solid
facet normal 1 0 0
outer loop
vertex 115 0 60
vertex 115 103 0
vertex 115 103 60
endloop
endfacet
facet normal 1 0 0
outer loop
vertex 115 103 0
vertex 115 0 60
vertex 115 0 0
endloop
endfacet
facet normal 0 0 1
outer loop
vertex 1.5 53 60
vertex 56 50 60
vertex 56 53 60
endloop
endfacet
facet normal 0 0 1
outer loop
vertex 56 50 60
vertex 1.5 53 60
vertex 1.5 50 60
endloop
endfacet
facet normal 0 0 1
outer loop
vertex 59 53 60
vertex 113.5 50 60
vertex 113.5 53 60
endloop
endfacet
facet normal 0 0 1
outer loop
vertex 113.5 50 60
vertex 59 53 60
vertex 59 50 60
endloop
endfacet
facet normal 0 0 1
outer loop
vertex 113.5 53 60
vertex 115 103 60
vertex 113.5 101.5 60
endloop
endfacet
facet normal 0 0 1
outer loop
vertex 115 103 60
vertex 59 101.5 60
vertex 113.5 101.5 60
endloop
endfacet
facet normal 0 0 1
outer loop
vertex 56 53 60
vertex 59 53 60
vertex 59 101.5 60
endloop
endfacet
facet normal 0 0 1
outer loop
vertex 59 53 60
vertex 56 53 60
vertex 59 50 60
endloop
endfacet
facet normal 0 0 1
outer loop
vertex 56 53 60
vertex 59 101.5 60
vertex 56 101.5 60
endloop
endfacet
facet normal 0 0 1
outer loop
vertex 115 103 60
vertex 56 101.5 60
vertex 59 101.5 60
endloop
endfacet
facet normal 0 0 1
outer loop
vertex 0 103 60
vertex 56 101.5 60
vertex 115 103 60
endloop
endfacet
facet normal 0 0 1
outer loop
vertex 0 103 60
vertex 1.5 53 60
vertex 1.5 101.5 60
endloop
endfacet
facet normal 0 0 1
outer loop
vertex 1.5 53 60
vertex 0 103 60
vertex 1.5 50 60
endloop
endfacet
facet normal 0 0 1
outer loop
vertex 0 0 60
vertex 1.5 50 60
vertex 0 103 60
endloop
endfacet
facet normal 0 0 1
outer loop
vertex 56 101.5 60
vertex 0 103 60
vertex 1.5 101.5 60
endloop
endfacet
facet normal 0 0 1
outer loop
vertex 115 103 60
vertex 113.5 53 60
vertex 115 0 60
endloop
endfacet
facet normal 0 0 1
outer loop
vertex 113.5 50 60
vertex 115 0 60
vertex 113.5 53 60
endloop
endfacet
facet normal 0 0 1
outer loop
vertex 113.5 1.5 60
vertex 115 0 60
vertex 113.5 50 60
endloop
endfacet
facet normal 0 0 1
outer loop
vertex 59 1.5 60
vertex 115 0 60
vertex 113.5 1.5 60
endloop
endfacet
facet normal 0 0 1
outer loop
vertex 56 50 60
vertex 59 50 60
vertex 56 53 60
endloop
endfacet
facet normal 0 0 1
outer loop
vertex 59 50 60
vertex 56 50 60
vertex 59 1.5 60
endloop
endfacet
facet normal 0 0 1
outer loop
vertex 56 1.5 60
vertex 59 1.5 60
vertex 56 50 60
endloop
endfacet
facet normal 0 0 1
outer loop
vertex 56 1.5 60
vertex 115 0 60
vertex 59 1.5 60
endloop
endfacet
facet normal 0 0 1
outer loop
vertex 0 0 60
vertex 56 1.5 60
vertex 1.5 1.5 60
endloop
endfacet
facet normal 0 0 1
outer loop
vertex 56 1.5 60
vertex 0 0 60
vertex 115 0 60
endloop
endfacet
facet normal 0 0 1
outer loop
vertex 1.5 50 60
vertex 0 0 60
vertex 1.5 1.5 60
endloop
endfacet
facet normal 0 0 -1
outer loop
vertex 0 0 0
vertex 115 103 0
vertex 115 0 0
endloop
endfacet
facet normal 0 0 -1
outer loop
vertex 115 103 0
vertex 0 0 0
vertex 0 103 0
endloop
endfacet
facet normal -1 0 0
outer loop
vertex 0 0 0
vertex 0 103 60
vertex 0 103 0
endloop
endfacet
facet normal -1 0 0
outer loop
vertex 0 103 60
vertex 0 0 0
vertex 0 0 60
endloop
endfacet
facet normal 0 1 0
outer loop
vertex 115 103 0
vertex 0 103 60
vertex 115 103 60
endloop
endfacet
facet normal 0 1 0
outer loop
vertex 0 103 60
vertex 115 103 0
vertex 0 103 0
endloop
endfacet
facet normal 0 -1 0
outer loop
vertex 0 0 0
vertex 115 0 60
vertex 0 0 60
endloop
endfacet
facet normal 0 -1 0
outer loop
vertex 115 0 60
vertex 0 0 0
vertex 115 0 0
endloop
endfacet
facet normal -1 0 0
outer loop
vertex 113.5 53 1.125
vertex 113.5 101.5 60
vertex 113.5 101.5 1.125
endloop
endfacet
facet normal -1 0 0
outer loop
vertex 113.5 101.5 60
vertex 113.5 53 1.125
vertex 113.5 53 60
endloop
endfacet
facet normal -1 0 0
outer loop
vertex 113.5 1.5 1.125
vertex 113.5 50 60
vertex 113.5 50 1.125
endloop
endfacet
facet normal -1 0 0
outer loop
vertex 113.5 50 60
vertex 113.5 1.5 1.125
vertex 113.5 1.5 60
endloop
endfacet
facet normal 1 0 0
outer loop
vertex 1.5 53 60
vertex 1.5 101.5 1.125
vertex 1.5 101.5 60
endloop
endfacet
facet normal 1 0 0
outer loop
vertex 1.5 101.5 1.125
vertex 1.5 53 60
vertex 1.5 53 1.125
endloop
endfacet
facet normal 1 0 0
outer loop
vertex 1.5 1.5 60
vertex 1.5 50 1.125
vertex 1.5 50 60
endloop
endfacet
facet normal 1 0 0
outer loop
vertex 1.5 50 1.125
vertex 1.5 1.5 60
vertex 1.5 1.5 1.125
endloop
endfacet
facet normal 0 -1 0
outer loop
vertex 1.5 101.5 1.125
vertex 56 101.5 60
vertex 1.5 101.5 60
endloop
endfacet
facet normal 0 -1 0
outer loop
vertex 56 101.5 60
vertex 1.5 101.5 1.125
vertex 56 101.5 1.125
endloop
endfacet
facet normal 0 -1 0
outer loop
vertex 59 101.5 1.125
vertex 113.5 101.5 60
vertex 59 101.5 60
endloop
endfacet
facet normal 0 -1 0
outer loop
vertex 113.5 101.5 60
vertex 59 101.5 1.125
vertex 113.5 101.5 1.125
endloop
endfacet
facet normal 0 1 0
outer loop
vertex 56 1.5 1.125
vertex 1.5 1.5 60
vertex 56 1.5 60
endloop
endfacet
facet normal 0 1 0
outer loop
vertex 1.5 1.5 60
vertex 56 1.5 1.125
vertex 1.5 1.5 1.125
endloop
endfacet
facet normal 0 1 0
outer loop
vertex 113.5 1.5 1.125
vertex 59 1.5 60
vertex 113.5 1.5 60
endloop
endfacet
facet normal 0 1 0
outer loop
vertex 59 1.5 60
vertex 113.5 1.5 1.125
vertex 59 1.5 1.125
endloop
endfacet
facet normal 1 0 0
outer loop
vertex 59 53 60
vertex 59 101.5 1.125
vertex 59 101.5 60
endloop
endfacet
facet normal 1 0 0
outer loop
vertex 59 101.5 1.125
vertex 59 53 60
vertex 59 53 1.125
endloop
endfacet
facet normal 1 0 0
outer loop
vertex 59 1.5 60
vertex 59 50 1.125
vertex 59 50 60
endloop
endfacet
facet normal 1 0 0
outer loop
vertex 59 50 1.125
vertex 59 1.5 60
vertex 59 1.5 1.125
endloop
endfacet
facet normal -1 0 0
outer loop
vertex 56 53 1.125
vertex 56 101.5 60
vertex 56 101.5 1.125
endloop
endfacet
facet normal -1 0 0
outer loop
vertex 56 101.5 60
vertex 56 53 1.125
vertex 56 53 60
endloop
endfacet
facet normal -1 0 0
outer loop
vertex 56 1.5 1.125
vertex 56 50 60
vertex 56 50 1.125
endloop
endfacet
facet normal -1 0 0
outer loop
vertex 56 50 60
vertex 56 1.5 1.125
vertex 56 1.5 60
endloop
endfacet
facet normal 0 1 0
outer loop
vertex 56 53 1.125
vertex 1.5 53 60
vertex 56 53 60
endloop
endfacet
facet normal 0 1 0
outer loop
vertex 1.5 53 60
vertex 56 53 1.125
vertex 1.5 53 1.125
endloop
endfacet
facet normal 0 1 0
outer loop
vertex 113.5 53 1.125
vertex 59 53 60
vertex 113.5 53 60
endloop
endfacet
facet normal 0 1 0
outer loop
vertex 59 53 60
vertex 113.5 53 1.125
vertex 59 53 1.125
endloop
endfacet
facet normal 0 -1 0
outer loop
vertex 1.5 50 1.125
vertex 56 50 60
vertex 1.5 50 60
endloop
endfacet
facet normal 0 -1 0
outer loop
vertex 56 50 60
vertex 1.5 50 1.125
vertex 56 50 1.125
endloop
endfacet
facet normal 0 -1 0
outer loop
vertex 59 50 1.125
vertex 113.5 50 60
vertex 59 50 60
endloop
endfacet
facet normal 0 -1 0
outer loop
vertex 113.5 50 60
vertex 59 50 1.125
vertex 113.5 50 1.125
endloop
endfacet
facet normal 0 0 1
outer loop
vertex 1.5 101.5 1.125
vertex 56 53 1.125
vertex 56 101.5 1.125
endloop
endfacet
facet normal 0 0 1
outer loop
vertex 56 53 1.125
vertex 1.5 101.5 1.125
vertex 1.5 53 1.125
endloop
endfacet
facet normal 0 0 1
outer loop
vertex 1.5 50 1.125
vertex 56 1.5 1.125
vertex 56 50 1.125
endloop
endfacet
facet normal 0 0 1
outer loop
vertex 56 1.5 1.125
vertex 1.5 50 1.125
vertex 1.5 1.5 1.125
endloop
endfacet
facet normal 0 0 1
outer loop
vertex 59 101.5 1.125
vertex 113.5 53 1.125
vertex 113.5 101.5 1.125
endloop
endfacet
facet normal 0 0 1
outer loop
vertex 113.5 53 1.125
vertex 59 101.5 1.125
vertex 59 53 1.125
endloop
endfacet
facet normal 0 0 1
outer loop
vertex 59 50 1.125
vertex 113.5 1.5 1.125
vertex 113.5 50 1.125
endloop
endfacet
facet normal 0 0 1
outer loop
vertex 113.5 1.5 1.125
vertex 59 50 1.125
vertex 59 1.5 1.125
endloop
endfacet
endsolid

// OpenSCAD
// 230x310
// 115 x 103
drawer_divider(width=115, depth=103, height=60, internal_wall=3, external_wall=1.5, floor_thickness=1.125, floor=1);

module drawer_divider(width=76, depth=76, height=25, external_wall=1, internal_wall=2, x_compartments=2, y_compartments=2, floor_thickness=1, floor=0) {
	difference() {
		cube([width,depth,height]);
		translate([external_wall,external_wall,-1])
			cube([width-external_wall*2,depth-external_wall*2,height+2]);
	}
	for (x_comp=[1:x_compartments-1])
		translate([x_comp/x_compartments*(width-external_wall*2)-internal_wall/2+external_wall,0,0])
			cube([internal_wall,depth,height]);
	for (y_comp=[1:y_compartments-1])
		translate([0,y_comp/y_compartments*(depth-external_wall*2)-internal_wall/2+external_wall,0])
			cube([width,internal_wall,height]);
	if (floor==1)
		cube([width,depth,floor_thickness]);
}
